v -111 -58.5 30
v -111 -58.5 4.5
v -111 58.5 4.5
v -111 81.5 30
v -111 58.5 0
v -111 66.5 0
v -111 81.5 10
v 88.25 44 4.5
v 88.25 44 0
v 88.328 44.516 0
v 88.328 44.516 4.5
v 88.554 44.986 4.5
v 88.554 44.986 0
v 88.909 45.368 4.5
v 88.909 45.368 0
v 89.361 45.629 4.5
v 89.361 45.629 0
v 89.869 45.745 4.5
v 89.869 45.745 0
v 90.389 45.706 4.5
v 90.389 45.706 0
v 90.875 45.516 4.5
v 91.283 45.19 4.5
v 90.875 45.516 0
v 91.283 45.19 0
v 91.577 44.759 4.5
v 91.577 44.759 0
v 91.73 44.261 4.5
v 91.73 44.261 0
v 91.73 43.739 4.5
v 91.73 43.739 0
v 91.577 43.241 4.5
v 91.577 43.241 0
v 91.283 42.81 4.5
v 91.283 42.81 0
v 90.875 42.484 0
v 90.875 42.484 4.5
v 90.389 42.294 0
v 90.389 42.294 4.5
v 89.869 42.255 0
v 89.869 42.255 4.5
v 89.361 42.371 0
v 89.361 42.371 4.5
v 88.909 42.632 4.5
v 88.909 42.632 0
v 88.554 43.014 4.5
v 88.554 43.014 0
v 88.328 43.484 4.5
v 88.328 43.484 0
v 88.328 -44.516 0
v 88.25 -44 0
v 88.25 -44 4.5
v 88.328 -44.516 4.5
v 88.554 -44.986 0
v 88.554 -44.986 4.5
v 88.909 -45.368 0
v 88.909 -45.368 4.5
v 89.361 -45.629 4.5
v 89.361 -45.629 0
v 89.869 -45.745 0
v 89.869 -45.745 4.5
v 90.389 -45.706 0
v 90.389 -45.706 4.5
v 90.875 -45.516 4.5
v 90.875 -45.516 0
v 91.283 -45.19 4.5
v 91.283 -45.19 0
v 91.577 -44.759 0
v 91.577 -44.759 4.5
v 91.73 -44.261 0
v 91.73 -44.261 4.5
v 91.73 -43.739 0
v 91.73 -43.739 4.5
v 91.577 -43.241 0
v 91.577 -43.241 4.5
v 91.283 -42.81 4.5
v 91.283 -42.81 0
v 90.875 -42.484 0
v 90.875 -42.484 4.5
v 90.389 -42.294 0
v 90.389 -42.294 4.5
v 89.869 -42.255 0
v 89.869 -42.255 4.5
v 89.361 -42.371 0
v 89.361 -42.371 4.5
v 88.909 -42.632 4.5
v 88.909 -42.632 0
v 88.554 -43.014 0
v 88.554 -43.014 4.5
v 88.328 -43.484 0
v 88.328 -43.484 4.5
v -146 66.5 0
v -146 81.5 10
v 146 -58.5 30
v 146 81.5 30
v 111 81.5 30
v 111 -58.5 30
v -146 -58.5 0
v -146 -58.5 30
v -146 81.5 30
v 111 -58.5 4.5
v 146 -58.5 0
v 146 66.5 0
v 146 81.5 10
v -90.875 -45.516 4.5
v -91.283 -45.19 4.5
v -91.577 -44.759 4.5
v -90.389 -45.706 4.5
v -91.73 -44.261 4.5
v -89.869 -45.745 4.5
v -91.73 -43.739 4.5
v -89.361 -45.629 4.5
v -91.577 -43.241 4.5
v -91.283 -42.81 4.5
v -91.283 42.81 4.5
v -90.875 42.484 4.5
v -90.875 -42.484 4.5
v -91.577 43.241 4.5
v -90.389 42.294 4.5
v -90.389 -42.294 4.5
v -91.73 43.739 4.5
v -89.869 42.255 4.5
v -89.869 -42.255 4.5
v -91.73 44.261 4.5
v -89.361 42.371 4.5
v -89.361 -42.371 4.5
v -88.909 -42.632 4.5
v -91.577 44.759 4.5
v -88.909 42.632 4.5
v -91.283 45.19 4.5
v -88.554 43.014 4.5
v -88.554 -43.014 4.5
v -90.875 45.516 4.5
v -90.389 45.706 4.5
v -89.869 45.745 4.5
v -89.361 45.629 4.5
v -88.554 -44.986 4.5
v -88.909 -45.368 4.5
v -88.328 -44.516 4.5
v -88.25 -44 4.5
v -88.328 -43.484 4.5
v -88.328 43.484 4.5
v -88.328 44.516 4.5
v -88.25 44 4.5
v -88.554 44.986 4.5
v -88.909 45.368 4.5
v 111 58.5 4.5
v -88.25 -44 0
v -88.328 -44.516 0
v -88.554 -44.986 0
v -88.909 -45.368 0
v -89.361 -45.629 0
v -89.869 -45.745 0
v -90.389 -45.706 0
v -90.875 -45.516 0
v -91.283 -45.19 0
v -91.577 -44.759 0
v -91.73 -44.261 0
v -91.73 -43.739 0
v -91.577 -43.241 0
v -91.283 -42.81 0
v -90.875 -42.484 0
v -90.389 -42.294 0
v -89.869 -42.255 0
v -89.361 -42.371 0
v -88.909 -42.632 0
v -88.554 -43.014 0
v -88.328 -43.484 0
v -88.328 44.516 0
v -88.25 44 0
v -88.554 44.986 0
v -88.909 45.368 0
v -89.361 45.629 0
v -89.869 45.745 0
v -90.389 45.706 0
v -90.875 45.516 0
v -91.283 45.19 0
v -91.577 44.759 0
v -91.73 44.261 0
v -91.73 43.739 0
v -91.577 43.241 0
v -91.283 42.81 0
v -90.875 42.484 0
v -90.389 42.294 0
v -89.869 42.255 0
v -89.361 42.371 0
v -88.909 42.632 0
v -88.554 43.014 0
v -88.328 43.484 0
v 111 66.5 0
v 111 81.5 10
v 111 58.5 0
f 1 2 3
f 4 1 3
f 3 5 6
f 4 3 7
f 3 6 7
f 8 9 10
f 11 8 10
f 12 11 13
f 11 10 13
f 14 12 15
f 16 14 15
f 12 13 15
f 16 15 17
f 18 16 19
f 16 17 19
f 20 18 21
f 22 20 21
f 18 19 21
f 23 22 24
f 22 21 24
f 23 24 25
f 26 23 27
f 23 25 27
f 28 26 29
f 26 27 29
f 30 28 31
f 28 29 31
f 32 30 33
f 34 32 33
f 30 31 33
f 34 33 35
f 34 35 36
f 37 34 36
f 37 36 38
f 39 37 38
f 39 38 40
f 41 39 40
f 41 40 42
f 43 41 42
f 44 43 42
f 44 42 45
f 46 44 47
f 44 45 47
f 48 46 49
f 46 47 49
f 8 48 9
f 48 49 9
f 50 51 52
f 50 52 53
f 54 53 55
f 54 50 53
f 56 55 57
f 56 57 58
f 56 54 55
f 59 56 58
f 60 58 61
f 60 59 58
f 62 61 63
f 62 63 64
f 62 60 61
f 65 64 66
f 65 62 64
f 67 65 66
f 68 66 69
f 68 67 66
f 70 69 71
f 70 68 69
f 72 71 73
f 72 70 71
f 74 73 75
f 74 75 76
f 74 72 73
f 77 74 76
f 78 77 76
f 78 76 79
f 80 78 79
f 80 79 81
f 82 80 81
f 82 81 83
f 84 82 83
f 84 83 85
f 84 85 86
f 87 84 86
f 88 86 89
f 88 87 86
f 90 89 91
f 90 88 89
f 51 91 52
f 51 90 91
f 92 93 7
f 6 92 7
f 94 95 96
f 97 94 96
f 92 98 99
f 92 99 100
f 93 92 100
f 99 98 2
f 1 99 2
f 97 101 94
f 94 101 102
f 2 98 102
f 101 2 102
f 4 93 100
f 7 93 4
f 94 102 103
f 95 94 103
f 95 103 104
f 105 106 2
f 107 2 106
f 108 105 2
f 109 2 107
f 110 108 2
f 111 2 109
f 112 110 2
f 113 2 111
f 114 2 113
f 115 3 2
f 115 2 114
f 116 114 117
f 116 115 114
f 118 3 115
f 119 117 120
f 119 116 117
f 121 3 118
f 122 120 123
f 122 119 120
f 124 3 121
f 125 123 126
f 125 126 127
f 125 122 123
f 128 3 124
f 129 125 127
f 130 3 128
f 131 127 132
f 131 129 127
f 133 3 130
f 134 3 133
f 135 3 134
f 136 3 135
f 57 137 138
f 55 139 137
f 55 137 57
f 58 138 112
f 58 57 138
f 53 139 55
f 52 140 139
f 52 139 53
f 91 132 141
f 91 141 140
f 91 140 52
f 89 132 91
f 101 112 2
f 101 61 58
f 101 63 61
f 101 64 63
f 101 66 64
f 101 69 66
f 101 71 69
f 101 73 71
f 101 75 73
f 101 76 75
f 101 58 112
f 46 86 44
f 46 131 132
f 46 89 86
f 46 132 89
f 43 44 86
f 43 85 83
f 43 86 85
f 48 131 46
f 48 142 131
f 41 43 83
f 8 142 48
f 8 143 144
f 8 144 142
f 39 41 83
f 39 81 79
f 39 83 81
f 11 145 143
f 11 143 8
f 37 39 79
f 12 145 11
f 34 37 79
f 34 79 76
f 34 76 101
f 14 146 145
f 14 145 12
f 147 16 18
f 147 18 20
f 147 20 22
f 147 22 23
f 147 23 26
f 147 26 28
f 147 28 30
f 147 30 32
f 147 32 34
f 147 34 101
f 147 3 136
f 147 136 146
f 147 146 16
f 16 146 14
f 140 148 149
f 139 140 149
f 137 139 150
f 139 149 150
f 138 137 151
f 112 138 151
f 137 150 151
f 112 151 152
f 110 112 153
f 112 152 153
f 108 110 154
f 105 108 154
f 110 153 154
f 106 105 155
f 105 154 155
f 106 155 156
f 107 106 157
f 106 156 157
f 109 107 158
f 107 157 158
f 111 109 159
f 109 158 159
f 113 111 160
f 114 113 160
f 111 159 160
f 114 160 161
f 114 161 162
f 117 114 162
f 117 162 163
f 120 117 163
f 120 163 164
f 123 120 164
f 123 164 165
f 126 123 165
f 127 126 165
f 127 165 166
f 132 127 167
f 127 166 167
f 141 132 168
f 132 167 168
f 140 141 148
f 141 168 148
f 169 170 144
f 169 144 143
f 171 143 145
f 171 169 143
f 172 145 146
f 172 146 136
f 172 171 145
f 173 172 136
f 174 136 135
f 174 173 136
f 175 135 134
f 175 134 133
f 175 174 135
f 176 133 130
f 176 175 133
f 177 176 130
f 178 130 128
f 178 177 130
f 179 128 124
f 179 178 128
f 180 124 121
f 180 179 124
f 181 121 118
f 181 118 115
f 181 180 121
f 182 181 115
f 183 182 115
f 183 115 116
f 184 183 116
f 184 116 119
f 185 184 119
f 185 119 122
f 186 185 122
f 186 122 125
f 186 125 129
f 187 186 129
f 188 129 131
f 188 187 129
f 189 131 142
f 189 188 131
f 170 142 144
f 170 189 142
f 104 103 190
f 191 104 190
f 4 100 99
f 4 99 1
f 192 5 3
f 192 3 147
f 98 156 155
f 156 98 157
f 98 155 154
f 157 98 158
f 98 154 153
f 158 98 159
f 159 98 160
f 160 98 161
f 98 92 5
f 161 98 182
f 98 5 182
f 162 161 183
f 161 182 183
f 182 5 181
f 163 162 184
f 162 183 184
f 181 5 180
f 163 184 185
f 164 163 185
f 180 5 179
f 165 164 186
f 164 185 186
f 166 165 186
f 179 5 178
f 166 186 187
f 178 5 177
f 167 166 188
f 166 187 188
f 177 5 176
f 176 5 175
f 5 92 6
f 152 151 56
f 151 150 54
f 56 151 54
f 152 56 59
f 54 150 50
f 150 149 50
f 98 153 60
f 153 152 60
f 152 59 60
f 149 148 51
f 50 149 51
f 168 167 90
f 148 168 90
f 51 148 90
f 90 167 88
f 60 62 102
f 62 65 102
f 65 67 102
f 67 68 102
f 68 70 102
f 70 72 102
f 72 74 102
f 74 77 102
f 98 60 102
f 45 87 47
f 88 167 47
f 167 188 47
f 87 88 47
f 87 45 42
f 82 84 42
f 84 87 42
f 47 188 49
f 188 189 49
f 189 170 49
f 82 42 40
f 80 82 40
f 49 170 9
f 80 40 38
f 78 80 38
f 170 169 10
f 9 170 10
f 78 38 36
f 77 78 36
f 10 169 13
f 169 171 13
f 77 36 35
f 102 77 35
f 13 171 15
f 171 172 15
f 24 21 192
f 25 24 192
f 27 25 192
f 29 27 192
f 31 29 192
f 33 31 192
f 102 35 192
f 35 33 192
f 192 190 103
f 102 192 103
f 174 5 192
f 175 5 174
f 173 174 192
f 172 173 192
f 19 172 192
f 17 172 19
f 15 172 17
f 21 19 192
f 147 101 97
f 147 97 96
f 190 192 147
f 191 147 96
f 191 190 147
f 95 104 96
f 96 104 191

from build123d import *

# Parameters (mm, degrees)
SKETCH1_W               = 292
SKETCH1_H               = 117
BOSS_EXTRUDE1_DEPTH     = 4.5
CUT_EXTRUDE1_REACH      = 159.348
SKETCH1_3_R             = 1.75
MIRROR3_COPY_1_REACH    = 159.348
MIRROR3_COPY_1_SKETCH_R = 1.75
MIRROR3_COPY_2_REACH    = 159.348
MIRROR3_COPY_2_SKETCH_R = 1.75
SKETCH2_W               = 35
SKETCH2_H               = 140
BOSS_EXTRUDE2_DEPTH     = 30
CHAMFER1_SIZE           = 10
CHAMFER1_SIZE2          = 15
CHAMFER2_SIZE           = 15
CHAMFER2_SIZE2          = 10


with BuildPart() as part:
    # Sketch1 → Boss-Extrude1 (new body)
    with BuildSketch(Plane.XY):
        Rectangle(SKETCH1_W, SKETCH1_H)
    extrude(amount=BOSS_EXTRUDE1_DEPTH)

    # Sketch1<3> → Cut-Extrude1 (cut, up to next)
    with BuildSketch(Plane.XY, mode=Mode.PRIVATE) as cut_extrude1_sk1:
        with Locations((-90, 44)):
            Circle(SKETCH1_3_R)
    cut_extrude1_tool1 = extrude(cut_extrude1_sk1.sketch, amount=CUT_EXTRUDE1_REACH, mode=Mode.PRIVATE) & part.part
    cut_extrude1 = cut_extrude1_tool1.solids().sort_by_distance((-90, 44, 0))[0]
    add(cut_extrude1, mode=Mode.SUBTRACT)

    # Mirror2: Cut-Extrude1 across plane
    add(cut_extrude1.mirror(Plane.ZX), mode=Mode.SUBTRACT)

    # Mirror3 copy 1 sketch → Mirror3 copy 1 (cut, up to next)
    with BuildSketch(Plane(origin=(0, 0, 0), x_dir=(-1, 0, 0), z_dir=(0, 0, 1)), mode=Mode.PRIVATE) as mirror3_copy_1_sk1:
        with Locations((-90, 44)):
            Circle(MIRROR3_COPY_1_SKETCH_R)
    mirror3_copy_1_tool1 = extrude(mirror3_copy_1_sk1.sketch, amount=MIRROR3_COPY_1_REACH, mode=Mode.PRIVATE) & part.part
    add(mirror3_copy_1_tool1.solids().sort_by_distance((90, -44, 0))[0], mode=Mode.SUBTRACT)

    # Mirror3 copy 2 sketch → Mirror3 copy 2 (cut, up to next)
    with BuildSketch(Plane(origin=(0, 0, 0), x_dir=(-1, 0, 0), z_dir=(0, 0, 1)), mode=Mode.PRIVATE) as mirror3_copy_2_sk1:
        with Locations((-90, -44)):
            Circle(MIRROR3_COPY_2_SKETCH_R)
    mirror3_copy_2_tool1 = extrude(mirror3_copy_2_sk1.sketch, amount=MIRROR3_COPY_2_REACH, mode=Mode.PRIVATE) & part.part
    add(mirror3_copy_2_tool1.solids().sort_by_distance((90, 44, 0))[0], mode=Mode.SUBTRACT)

    # Sketch2 → Boss-Extrude2 (add)
    with BuildSketch(Plane(origin=(0, 0, 0), x_dir=(-1, 0, 0), z_dir=(0, 0, -1))):
        with Locations((-128.5, 11.5)):
            Rectangle(SKETCH2_W, SKETCH2_H)
    boss_extrude2 = extrude(amount=-BOSS_EXTRUDE2_DEPTH)

    # Chamfer1
    chamfer1_edges = [part.edges().sort_by_distance(p)[0] for p in [
        (128.5, 81.5, 0),
    ]]
    chamfer1_side = [part.faces().sort_by_distance(p)[0] for p in [
        (128.5, 81.5, 15),
    ]]
    chamfer(chamfer1_edges, length=CHAMFER1_SIZE, length2=CHAMFER1_SIZE2, reference=chamfer1_side[0])

    # Mirror5: Boss-Extrude2 across plane
    add(boss_extrude2.mirror(Plane(origin=(0, 0, 0), x_dir=(0, 0, 1), z_dir=(1, 0, 0))))

    # Chamfer2
    chamfer2_edges = [part.edges().sort_by_distance(p)[0] for p in [
        (-128.5, 81.5, 0),
    ]]
    chamfer2_side = [part.faces().sort_by_distance(p)[0] for p in [
        (-1.915975925, 2.0973848, 0),
    ]]
    chamfer(chamfer2_edges, length=CHAMFER2_SIZE, length2=CHAMFER2_SIZE2, reference=chamfer2_side[0])


solid = part.part
